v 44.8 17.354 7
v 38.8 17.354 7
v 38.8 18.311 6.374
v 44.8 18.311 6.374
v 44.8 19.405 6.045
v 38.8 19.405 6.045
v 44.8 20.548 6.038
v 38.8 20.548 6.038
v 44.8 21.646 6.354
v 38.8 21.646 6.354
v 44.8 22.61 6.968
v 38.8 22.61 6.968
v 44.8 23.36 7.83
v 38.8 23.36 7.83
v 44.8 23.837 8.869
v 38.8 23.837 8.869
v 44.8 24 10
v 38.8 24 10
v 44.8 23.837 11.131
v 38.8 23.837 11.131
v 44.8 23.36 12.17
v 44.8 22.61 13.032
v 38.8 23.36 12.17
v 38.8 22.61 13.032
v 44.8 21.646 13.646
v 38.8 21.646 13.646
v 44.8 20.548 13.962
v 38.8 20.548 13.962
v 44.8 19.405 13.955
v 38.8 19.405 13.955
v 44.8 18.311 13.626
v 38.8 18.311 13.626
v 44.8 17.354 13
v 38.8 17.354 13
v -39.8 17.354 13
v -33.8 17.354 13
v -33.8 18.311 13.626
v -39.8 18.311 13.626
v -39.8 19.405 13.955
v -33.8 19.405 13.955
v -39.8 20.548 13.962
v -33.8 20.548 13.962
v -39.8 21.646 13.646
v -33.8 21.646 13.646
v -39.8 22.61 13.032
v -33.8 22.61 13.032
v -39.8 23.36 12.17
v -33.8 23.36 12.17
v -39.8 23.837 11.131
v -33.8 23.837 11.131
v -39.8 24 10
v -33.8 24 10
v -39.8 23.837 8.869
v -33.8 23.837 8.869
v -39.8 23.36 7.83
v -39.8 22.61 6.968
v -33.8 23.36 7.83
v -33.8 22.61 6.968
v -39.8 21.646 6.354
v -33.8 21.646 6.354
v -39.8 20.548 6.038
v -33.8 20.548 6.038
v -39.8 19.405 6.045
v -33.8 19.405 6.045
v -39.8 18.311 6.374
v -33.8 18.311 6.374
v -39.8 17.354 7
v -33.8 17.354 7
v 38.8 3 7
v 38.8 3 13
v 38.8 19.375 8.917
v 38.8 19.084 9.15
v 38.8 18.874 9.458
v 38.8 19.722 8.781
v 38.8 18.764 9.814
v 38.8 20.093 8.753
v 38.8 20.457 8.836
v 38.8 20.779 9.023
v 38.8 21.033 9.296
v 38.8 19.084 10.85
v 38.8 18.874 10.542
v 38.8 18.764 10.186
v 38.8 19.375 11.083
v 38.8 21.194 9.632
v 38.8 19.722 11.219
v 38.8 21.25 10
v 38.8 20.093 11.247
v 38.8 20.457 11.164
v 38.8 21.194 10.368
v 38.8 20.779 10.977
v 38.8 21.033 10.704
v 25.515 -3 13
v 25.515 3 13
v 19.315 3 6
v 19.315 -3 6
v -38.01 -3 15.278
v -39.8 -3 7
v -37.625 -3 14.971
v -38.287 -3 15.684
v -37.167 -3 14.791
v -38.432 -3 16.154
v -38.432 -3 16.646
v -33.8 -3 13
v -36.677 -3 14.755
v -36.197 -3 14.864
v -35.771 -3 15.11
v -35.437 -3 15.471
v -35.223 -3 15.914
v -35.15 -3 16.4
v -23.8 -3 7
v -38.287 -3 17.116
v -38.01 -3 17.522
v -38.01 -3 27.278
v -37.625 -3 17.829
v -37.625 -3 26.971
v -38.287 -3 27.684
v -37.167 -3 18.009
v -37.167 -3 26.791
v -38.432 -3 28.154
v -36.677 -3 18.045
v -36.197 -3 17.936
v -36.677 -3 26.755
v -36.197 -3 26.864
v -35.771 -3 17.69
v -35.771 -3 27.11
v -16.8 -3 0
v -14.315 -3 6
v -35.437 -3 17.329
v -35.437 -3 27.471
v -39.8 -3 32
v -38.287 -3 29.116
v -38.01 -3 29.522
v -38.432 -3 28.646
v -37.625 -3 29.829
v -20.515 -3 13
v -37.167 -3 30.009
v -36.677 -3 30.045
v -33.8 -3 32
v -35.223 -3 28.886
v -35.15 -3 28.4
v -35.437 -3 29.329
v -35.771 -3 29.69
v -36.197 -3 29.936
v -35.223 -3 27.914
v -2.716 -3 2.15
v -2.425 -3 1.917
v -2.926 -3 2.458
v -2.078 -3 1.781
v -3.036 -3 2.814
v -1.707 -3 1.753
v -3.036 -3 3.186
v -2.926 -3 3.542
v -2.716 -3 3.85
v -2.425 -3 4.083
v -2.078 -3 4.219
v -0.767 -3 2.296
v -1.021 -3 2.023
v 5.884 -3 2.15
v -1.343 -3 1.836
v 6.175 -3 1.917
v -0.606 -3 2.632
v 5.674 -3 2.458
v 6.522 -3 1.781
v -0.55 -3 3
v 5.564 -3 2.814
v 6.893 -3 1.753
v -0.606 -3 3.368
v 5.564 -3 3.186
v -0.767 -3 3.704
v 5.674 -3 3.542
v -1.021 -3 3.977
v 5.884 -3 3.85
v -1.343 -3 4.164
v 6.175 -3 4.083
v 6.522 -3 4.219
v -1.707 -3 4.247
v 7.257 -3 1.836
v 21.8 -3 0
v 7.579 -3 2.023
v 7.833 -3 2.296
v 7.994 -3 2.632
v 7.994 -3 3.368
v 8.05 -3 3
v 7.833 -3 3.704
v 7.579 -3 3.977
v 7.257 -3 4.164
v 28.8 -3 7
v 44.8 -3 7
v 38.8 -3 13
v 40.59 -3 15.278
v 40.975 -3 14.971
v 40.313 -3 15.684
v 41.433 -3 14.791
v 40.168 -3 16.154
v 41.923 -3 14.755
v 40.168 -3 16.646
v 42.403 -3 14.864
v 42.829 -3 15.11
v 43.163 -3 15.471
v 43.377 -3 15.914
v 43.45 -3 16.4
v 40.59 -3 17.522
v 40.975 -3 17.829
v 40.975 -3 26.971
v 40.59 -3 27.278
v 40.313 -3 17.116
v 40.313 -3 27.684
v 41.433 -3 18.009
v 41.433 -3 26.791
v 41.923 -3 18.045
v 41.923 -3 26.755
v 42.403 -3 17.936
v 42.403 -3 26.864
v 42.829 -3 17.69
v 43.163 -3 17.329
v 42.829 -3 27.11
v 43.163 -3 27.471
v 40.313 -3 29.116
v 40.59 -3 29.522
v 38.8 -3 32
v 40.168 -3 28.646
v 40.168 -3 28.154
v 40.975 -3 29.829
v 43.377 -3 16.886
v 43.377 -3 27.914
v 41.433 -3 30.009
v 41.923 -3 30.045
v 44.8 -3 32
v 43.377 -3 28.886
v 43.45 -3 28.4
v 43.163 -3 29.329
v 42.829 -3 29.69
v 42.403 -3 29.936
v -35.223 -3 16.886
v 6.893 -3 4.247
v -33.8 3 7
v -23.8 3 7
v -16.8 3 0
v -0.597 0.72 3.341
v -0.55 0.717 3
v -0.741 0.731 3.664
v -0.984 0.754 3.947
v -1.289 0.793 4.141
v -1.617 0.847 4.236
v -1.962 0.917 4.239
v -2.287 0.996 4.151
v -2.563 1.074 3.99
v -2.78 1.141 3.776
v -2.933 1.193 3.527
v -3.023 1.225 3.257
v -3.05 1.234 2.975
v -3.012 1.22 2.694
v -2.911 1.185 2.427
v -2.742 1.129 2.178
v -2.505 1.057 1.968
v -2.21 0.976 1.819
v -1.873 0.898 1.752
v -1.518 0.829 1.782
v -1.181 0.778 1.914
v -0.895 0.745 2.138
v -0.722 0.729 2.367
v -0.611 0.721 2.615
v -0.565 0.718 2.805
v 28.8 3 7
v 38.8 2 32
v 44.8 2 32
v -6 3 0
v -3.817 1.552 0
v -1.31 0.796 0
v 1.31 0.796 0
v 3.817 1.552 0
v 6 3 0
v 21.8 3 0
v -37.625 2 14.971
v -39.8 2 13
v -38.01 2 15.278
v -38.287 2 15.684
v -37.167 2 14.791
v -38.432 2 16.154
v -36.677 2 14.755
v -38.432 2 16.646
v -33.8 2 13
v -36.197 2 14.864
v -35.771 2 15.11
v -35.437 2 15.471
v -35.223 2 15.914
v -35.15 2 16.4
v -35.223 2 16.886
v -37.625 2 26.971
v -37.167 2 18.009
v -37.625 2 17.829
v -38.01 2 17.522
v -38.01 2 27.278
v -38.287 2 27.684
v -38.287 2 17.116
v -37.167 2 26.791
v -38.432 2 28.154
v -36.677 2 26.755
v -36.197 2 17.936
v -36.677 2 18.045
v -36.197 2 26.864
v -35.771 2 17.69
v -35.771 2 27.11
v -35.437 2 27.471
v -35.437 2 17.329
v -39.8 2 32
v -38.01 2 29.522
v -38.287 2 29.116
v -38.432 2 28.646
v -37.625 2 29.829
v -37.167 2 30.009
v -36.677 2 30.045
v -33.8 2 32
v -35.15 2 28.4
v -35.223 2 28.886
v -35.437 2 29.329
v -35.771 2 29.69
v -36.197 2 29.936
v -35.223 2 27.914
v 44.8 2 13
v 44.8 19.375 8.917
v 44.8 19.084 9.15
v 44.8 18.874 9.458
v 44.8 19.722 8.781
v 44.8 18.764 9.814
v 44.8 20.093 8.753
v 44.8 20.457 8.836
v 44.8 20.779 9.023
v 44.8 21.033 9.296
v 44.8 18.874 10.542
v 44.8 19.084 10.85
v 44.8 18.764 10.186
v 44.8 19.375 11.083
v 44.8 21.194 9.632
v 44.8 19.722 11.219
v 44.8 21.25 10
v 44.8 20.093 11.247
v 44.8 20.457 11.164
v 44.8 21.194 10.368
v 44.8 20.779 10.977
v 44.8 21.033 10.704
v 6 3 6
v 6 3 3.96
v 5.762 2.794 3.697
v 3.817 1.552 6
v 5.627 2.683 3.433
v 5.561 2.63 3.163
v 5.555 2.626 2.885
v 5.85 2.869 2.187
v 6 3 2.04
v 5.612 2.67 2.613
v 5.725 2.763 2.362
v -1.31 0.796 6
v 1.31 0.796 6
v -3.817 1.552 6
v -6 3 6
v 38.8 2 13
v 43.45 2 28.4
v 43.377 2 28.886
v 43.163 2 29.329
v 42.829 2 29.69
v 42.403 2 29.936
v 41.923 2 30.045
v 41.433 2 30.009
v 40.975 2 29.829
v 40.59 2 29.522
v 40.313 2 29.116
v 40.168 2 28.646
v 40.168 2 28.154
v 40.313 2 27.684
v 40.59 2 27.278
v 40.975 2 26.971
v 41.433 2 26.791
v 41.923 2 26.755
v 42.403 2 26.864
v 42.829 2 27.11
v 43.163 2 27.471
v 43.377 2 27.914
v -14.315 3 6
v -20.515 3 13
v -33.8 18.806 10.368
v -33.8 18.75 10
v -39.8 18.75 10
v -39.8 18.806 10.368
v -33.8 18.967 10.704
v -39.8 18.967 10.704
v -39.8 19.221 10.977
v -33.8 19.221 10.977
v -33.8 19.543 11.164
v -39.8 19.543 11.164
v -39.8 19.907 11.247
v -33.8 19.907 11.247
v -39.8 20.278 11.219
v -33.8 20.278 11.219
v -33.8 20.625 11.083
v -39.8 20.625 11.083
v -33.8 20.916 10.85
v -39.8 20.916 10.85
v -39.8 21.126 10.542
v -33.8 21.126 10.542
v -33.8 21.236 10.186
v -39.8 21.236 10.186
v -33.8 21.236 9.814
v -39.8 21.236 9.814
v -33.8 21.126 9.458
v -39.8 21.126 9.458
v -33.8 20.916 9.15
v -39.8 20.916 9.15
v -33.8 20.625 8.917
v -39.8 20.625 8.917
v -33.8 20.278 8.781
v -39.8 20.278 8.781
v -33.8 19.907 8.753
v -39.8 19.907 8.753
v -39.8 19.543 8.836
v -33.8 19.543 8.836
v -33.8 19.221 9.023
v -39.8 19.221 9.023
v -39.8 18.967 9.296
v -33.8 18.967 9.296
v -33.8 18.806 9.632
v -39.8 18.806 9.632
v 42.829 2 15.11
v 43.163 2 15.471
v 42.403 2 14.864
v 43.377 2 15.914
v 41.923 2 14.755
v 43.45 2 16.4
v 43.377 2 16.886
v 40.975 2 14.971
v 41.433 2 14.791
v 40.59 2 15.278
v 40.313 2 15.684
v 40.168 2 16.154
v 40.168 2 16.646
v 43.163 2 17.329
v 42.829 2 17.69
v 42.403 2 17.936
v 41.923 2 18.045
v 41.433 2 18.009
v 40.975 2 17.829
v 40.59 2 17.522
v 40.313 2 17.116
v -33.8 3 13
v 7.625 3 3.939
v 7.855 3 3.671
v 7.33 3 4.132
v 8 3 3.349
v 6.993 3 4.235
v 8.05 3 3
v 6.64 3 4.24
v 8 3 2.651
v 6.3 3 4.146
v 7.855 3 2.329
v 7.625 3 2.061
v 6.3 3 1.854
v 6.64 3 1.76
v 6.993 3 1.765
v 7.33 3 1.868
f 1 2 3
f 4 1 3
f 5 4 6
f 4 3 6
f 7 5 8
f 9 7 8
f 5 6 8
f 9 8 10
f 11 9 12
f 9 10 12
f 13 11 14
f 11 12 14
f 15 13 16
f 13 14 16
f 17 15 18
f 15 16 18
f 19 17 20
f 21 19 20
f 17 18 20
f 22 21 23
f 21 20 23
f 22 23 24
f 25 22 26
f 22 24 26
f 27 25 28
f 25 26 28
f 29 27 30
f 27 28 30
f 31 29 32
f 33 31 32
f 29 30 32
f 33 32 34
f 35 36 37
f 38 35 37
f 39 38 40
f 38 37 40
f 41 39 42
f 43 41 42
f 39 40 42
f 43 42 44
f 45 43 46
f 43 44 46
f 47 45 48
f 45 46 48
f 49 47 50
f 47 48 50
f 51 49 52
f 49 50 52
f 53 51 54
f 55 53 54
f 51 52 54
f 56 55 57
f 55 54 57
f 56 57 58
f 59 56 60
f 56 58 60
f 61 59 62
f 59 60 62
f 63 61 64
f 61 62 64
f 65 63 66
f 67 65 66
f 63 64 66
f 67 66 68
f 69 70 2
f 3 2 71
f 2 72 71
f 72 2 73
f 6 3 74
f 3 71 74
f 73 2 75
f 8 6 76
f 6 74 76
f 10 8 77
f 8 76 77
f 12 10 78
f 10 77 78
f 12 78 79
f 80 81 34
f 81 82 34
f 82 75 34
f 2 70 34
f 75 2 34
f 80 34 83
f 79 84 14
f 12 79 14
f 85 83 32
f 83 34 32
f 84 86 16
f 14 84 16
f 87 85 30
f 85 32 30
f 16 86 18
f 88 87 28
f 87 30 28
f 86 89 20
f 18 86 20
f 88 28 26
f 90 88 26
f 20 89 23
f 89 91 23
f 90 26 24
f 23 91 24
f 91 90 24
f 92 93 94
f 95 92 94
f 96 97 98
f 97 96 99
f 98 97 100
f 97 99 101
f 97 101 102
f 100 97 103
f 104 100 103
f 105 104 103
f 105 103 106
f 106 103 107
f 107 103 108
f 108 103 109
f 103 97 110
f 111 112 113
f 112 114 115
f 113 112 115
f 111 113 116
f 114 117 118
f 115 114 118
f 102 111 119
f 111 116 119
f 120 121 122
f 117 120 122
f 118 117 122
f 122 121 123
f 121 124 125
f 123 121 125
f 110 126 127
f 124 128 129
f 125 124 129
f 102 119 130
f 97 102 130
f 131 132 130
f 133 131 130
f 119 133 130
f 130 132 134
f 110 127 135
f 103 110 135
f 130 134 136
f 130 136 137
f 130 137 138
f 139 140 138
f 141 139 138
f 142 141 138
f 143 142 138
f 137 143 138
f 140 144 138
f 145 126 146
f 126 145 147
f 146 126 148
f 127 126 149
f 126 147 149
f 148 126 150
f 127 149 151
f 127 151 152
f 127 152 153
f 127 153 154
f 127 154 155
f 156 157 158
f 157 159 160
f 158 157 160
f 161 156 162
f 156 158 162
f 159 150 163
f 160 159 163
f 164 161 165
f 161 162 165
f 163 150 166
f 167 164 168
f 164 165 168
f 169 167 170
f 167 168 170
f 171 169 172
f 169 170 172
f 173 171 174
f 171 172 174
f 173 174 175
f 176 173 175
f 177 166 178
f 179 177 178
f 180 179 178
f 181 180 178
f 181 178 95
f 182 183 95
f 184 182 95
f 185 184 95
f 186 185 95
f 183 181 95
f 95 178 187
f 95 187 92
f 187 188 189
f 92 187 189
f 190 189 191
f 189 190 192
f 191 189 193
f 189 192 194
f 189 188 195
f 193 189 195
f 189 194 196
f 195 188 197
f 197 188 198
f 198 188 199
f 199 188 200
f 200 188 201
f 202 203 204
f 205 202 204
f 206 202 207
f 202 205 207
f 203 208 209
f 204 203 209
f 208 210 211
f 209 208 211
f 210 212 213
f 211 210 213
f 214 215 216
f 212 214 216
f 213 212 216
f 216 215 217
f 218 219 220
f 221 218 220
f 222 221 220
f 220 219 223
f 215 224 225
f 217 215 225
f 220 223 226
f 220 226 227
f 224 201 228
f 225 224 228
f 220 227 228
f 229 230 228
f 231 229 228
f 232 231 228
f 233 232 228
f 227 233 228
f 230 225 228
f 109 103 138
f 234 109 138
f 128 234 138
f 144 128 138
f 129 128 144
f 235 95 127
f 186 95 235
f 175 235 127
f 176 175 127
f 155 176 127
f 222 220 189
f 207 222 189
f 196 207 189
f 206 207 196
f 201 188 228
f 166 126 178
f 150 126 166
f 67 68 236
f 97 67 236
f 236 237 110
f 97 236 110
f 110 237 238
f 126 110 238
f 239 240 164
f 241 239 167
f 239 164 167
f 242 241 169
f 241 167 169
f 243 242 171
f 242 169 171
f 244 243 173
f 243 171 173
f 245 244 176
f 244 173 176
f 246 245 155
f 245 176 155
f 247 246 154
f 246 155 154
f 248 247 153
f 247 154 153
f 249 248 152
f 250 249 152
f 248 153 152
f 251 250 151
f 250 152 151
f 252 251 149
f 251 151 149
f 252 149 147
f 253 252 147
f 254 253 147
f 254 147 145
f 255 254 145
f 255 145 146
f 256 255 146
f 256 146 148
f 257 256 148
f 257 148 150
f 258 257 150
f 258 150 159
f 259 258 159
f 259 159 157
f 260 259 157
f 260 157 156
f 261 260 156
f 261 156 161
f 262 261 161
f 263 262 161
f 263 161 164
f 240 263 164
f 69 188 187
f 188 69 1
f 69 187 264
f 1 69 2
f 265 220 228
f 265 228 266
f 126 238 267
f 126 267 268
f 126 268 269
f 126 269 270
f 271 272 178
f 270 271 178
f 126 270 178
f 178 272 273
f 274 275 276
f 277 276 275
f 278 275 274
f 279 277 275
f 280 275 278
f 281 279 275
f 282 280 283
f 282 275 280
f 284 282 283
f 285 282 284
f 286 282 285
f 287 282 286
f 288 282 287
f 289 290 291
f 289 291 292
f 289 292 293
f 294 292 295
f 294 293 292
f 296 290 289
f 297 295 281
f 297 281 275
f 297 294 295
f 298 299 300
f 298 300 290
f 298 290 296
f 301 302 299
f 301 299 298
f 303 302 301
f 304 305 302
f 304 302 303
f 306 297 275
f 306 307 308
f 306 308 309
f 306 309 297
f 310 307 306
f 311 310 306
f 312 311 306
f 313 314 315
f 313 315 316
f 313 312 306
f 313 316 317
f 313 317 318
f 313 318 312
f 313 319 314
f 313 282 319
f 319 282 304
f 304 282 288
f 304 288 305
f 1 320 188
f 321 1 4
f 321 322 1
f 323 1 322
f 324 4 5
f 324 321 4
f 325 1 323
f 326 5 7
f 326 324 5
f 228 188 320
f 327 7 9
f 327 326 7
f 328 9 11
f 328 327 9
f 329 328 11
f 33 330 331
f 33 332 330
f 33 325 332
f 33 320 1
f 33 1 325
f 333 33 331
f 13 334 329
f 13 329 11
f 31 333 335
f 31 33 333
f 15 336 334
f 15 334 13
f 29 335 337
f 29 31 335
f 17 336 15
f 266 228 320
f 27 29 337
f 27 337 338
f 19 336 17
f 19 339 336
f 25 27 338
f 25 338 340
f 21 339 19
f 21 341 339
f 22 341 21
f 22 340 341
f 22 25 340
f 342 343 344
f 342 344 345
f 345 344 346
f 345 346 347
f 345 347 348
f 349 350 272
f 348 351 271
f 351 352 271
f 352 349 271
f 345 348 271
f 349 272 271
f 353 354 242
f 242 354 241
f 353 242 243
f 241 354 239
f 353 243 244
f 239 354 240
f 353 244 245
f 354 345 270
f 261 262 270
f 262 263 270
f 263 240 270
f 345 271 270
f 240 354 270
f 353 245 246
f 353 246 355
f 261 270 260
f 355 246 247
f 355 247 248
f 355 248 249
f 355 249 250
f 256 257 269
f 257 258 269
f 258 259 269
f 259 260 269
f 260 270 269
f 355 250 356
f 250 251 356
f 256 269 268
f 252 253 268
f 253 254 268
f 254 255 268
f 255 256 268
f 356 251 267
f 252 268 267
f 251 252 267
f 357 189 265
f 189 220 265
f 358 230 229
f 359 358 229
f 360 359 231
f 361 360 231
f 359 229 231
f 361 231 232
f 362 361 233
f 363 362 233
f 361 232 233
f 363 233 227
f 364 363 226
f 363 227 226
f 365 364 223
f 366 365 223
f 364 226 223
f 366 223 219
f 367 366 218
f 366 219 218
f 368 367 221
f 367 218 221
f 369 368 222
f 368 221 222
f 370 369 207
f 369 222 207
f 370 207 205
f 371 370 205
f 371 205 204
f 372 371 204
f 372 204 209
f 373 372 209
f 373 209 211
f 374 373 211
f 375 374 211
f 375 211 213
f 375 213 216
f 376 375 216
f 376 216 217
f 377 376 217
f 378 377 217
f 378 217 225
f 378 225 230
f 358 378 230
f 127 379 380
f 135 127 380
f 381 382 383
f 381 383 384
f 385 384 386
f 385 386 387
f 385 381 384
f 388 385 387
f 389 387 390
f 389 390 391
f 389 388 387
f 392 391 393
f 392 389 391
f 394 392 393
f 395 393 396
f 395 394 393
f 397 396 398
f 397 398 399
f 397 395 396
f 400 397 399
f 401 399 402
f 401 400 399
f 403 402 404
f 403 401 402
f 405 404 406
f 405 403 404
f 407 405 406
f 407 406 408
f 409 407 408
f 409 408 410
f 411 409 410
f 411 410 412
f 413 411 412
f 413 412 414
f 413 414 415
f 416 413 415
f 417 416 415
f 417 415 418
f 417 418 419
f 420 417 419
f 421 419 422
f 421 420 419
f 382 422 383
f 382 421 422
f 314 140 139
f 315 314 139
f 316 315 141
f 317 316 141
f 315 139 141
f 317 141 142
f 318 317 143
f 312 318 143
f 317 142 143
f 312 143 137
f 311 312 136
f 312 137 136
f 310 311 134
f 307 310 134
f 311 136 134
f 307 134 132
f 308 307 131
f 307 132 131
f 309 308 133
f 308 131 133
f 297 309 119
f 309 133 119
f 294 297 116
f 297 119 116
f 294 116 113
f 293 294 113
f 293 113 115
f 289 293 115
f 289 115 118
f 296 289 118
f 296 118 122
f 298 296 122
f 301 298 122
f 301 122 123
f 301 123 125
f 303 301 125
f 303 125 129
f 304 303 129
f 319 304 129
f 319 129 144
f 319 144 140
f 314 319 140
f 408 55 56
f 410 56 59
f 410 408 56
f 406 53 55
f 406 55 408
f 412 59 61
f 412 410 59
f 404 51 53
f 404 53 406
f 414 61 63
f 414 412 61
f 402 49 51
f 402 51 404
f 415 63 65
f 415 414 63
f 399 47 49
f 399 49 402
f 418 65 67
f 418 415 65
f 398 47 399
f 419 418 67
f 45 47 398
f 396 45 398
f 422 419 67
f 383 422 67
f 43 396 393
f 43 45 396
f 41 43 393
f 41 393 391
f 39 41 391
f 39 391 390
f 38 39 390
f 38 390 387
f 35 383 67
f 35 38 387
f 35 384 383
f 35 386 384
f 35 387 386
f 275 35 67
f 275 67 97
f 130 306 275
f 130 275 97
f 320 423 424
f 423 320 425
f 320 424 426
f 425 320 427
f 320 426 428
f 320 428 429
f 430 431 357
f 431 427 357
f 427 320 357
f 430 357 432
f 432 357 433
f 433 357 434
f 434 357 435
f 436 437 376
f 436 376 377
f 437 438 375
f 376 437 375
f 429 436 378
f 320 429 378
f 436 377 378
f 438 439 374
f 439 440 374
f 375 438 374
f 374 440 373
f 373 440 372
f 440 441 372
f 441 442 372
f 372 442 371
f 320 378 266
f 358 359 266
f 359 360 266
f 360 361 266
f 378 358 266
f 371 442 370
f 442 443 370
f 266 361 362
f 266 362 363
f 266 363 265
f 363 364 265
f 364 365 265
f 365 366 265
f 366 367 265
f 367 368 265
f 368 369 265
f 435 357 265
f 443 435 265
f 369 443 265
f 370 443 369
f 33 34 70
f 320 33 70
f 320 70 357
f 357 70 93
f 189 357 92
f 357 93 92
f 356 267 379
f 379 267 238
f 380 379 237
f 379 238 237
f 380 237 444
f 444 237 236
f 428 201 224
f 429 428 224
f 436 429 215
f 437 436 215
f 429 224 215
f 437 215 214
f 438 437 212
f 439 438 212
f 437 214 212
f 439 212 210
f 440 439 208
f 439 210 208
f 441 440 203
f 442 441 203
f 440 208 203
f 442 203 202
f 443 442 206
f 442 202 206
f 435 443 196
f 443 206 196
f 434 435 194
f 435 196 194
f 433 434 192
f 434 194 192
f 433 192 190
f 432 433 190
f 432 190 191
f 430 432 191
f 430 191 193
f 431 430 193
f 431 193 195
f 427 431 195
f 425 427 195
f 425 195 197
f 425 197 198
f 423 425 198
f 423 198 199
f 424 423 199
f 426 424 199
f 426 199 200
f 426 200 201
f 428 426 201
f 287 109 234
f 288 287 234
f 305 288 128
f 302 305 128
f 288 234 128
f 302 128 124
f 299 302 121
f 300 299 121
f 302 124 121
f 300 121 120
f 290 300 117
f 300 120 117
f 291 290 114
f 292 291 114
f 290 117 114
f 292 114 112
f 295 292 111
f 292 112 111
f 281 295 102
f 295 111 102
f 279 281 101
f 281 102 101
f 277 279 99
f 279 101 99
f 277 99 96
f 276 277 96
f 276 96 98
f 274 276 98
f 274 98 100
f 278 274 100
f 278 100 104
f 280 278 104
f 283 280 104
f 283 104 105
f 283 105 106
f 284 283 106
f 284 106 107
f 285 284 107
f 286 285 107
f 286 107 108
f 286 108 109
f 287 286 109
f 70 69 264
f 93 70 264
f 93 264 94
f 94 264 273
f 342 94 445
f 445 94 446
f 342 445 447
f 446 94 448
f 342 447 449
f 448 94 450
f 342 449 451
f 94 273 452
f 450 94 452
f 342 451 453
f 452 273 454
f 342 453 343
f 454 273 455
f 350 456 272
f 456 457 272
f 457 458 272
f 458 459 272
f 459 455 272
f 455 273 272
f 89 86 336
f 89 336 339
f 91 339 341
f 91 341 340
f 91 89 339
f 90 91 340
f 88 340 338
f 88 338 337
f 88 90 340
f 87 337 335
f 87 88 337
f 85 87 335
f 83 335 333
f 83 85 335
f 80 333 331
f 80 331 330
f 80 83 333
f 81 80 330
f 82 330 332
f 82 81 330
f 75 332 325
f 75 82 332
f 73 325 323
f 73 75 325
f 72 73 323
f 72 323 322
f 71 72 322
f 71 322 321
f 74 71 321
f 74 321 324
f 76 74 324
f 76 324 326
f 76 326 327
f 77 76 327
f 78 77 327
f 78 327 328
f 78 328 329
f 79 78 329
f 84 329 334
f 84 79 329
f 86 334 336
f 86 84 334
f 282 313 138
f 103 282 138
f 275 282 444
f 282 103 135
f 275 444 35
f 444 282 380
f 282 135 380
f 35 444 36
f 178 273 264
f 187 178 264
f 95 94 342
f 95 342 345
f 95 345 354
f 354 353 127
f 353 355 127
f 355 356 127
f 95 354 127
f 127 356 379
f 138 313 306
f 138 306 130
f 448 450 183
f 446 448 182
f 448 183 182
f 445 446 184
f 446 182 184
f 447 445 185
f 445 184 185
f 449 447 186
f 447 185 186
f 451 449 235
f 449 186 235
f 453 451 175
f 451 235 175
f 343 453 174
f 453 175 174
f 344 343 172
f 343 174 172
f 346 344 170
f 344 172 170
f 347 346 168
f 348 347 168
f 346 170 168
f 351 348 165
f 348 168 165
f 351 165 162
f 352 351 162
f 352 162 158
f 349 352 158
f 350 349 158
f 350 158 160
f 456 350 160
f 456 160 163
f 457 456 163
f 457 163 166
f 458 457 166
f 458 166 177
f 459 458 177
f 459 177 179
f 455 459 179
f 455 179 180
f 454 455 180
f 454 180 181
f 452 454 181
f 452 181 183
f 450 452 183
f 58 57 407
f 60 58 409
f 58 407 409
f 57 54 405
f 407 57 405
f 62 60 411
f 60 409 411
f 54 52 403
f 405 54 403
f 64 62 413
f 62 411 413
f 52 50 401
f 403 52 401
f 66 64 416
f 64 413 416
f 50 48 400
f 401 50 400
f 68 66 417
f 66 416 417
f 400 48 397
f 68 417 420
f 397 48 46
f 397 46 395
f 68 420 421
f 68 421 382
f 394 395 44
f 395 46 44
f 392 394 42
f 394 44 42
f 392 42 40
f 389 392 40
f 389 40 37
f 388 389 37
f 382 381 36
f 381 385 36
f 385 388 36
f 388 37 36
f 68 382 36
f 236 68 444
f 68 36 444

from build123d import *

# Parameters (mm, degrees)
F1_DEPTH  = 13
F2_W      = 10
F2_H      = 7
F3_DEPTH  = 6.001
F5_DEPTH  = 13.001
F6_R      = 1.25
F7_DEPTH  = 6.001
F8_R      = 1.25
F8_W      = 5
F8_H      = 19
F9_DEPTH  = 6
F10_R     = 1.65
F11_DEPTH = 27.001
F12_W     = 5
F12_H     = 19
F12_R     = 1.25
F13_DEPTH = 6
F14_R     = 1.65
F15_DEPTH = 27.001


with BuildPart() as f1:
    # F0 (on Top) → F1 (new body)
    with BuildSketch(Plane.XY):
        Polygon((38.8, 3), (-33.8, 3), (-33.8, -3), (-6, -3), (6, -3), (38.8, -3), align=None)
    extrude(amount=F1_DEPTH)

    # F2 (on face) → F3 (cut, through all)
    with BuildSketch(Plane(origin=(0, 3, 0), x_dir=(-1, 0, 0), z_dir=(0, 1, 0))):
        Polygon((-28.8, 7), (-28.8, 0), (-21.8, 0), align=None)
        with Locations((-33.8, 3.5)):
            Rectangle(F2_W, F2_H)
        Polygon((20.5147186258, 13), (-25.5147186258, 13), (-19.3147186258, 6), (14.3147186258, 6), align=None)
        Polygon((23.8, 7), (16.8, 0), (23.8, 0), align=None)
        with Locations((28.8, 3.5)):
            Rectangle(F2_W, F2_H)
    extrude(amount=-F3_DEPTH, mode=Mode.SUBTRACT)

    # F4 (on face) → F5 (cut, through all)
    with BuildSketch(Plane(origin=(0, 0, 0), x_dir=(1, 0, 0), z_dir=(0, 0, -1))):
        with BuildLine():
            Line((-6, -3), (6, -3))
            ThreePointArc((6, -3), (0, -0.7), (-6, -3))
        make_face()
    extrude(amount=-F5_DEPTH, mode=Mode.SUBTRACT)

    # F6 (on face) → F7 (cut, through all)
    with BuildSketch(Plane.XZ.offset(3)):
        with Locations((-1.8, 3)):
            Circle(F6_R)
        with Locations((6.8, 3)):
            Circle(F6_R)
    extrude(amount=-F7_DEPTH, mode=Mode.SUBTRACT)

    # F8 (on face) → F9 (join)
    with BuildSketch(Plane.YZ.offset(38.8)):
        with BuildLine():
            Line((3, 13), (3, 7))
            Line((3, 7), (17.3542486889, 7))
            ThreePointArc((17.3542486889, 7), (24, 10), (17.3542486889, 13))
            Line((17.3542486889, 13), (3, 13))
        make_face()
        with Locations((20, 10)):
            Circle(F8_R, mode=Mode.SUBTRACT)
        with Locations((-0.5, 22.5)):
            Rectangle(F8_W, F8_H)
        Polygon((-3, 13), (-3, 7), (3, 7), (3, 13), (2, 13), align=None)
    extrude(amount=F9_DEPTH)

    # F10 (on face) → F11 (cut, through all)
    with BuildSketch(Plane.XZ.offset(3)):
        with Locations((41.8, 16.4)):
            Circle(F10_R)
        with Locations((41.8, 28.4)):
            Circle(F10_R)
    extrude(amount=-F11_DEPTH, mode=Mode.SUBTRACT)

    # F12 (on face) → F13 (join)
    with BuildSketch(Plane(origin=(-33.8, 0, 0), x_dir=(0, -1, 0), z_dir=(-1, 0, 0))):
        with Locations((0.5, 22.5)):
            Rectangle(F12_W, F12_H)
        with BuildLine():
            Line((-17.3542486889, 7), (-3, 7))
            Line((-3, 7), (-3, 13))
            Line((-3, 13), (-17.3542486889, 13))
            ThreePointArc((-17.3542486889, 13), (-24, 10), (-17.3542486889, 7))
        make_face()
        with Locations((-20, 10)):
            Circle(F12_R, mode=Mode.SUBTRACT)
        Polygon((3, 7), (3, 13), (-2, 13), (-3, 13), (-3, 7), align=None)
    extrude(amount=F13_DEPTH)

    # F14 (on face) → F15 (cut, through all)
    with BuildSketch(Plane.XZ.offset(3)):
        with Locations((-36.8, 28.4)):
            Circle(F14_R)
        with Locations((-36.8, 16.4)):
            Circle(F14_R)
    extrude(amount=-F15_DEPTH, mode=Mode.SUBTRACT)


solid = f1.part
